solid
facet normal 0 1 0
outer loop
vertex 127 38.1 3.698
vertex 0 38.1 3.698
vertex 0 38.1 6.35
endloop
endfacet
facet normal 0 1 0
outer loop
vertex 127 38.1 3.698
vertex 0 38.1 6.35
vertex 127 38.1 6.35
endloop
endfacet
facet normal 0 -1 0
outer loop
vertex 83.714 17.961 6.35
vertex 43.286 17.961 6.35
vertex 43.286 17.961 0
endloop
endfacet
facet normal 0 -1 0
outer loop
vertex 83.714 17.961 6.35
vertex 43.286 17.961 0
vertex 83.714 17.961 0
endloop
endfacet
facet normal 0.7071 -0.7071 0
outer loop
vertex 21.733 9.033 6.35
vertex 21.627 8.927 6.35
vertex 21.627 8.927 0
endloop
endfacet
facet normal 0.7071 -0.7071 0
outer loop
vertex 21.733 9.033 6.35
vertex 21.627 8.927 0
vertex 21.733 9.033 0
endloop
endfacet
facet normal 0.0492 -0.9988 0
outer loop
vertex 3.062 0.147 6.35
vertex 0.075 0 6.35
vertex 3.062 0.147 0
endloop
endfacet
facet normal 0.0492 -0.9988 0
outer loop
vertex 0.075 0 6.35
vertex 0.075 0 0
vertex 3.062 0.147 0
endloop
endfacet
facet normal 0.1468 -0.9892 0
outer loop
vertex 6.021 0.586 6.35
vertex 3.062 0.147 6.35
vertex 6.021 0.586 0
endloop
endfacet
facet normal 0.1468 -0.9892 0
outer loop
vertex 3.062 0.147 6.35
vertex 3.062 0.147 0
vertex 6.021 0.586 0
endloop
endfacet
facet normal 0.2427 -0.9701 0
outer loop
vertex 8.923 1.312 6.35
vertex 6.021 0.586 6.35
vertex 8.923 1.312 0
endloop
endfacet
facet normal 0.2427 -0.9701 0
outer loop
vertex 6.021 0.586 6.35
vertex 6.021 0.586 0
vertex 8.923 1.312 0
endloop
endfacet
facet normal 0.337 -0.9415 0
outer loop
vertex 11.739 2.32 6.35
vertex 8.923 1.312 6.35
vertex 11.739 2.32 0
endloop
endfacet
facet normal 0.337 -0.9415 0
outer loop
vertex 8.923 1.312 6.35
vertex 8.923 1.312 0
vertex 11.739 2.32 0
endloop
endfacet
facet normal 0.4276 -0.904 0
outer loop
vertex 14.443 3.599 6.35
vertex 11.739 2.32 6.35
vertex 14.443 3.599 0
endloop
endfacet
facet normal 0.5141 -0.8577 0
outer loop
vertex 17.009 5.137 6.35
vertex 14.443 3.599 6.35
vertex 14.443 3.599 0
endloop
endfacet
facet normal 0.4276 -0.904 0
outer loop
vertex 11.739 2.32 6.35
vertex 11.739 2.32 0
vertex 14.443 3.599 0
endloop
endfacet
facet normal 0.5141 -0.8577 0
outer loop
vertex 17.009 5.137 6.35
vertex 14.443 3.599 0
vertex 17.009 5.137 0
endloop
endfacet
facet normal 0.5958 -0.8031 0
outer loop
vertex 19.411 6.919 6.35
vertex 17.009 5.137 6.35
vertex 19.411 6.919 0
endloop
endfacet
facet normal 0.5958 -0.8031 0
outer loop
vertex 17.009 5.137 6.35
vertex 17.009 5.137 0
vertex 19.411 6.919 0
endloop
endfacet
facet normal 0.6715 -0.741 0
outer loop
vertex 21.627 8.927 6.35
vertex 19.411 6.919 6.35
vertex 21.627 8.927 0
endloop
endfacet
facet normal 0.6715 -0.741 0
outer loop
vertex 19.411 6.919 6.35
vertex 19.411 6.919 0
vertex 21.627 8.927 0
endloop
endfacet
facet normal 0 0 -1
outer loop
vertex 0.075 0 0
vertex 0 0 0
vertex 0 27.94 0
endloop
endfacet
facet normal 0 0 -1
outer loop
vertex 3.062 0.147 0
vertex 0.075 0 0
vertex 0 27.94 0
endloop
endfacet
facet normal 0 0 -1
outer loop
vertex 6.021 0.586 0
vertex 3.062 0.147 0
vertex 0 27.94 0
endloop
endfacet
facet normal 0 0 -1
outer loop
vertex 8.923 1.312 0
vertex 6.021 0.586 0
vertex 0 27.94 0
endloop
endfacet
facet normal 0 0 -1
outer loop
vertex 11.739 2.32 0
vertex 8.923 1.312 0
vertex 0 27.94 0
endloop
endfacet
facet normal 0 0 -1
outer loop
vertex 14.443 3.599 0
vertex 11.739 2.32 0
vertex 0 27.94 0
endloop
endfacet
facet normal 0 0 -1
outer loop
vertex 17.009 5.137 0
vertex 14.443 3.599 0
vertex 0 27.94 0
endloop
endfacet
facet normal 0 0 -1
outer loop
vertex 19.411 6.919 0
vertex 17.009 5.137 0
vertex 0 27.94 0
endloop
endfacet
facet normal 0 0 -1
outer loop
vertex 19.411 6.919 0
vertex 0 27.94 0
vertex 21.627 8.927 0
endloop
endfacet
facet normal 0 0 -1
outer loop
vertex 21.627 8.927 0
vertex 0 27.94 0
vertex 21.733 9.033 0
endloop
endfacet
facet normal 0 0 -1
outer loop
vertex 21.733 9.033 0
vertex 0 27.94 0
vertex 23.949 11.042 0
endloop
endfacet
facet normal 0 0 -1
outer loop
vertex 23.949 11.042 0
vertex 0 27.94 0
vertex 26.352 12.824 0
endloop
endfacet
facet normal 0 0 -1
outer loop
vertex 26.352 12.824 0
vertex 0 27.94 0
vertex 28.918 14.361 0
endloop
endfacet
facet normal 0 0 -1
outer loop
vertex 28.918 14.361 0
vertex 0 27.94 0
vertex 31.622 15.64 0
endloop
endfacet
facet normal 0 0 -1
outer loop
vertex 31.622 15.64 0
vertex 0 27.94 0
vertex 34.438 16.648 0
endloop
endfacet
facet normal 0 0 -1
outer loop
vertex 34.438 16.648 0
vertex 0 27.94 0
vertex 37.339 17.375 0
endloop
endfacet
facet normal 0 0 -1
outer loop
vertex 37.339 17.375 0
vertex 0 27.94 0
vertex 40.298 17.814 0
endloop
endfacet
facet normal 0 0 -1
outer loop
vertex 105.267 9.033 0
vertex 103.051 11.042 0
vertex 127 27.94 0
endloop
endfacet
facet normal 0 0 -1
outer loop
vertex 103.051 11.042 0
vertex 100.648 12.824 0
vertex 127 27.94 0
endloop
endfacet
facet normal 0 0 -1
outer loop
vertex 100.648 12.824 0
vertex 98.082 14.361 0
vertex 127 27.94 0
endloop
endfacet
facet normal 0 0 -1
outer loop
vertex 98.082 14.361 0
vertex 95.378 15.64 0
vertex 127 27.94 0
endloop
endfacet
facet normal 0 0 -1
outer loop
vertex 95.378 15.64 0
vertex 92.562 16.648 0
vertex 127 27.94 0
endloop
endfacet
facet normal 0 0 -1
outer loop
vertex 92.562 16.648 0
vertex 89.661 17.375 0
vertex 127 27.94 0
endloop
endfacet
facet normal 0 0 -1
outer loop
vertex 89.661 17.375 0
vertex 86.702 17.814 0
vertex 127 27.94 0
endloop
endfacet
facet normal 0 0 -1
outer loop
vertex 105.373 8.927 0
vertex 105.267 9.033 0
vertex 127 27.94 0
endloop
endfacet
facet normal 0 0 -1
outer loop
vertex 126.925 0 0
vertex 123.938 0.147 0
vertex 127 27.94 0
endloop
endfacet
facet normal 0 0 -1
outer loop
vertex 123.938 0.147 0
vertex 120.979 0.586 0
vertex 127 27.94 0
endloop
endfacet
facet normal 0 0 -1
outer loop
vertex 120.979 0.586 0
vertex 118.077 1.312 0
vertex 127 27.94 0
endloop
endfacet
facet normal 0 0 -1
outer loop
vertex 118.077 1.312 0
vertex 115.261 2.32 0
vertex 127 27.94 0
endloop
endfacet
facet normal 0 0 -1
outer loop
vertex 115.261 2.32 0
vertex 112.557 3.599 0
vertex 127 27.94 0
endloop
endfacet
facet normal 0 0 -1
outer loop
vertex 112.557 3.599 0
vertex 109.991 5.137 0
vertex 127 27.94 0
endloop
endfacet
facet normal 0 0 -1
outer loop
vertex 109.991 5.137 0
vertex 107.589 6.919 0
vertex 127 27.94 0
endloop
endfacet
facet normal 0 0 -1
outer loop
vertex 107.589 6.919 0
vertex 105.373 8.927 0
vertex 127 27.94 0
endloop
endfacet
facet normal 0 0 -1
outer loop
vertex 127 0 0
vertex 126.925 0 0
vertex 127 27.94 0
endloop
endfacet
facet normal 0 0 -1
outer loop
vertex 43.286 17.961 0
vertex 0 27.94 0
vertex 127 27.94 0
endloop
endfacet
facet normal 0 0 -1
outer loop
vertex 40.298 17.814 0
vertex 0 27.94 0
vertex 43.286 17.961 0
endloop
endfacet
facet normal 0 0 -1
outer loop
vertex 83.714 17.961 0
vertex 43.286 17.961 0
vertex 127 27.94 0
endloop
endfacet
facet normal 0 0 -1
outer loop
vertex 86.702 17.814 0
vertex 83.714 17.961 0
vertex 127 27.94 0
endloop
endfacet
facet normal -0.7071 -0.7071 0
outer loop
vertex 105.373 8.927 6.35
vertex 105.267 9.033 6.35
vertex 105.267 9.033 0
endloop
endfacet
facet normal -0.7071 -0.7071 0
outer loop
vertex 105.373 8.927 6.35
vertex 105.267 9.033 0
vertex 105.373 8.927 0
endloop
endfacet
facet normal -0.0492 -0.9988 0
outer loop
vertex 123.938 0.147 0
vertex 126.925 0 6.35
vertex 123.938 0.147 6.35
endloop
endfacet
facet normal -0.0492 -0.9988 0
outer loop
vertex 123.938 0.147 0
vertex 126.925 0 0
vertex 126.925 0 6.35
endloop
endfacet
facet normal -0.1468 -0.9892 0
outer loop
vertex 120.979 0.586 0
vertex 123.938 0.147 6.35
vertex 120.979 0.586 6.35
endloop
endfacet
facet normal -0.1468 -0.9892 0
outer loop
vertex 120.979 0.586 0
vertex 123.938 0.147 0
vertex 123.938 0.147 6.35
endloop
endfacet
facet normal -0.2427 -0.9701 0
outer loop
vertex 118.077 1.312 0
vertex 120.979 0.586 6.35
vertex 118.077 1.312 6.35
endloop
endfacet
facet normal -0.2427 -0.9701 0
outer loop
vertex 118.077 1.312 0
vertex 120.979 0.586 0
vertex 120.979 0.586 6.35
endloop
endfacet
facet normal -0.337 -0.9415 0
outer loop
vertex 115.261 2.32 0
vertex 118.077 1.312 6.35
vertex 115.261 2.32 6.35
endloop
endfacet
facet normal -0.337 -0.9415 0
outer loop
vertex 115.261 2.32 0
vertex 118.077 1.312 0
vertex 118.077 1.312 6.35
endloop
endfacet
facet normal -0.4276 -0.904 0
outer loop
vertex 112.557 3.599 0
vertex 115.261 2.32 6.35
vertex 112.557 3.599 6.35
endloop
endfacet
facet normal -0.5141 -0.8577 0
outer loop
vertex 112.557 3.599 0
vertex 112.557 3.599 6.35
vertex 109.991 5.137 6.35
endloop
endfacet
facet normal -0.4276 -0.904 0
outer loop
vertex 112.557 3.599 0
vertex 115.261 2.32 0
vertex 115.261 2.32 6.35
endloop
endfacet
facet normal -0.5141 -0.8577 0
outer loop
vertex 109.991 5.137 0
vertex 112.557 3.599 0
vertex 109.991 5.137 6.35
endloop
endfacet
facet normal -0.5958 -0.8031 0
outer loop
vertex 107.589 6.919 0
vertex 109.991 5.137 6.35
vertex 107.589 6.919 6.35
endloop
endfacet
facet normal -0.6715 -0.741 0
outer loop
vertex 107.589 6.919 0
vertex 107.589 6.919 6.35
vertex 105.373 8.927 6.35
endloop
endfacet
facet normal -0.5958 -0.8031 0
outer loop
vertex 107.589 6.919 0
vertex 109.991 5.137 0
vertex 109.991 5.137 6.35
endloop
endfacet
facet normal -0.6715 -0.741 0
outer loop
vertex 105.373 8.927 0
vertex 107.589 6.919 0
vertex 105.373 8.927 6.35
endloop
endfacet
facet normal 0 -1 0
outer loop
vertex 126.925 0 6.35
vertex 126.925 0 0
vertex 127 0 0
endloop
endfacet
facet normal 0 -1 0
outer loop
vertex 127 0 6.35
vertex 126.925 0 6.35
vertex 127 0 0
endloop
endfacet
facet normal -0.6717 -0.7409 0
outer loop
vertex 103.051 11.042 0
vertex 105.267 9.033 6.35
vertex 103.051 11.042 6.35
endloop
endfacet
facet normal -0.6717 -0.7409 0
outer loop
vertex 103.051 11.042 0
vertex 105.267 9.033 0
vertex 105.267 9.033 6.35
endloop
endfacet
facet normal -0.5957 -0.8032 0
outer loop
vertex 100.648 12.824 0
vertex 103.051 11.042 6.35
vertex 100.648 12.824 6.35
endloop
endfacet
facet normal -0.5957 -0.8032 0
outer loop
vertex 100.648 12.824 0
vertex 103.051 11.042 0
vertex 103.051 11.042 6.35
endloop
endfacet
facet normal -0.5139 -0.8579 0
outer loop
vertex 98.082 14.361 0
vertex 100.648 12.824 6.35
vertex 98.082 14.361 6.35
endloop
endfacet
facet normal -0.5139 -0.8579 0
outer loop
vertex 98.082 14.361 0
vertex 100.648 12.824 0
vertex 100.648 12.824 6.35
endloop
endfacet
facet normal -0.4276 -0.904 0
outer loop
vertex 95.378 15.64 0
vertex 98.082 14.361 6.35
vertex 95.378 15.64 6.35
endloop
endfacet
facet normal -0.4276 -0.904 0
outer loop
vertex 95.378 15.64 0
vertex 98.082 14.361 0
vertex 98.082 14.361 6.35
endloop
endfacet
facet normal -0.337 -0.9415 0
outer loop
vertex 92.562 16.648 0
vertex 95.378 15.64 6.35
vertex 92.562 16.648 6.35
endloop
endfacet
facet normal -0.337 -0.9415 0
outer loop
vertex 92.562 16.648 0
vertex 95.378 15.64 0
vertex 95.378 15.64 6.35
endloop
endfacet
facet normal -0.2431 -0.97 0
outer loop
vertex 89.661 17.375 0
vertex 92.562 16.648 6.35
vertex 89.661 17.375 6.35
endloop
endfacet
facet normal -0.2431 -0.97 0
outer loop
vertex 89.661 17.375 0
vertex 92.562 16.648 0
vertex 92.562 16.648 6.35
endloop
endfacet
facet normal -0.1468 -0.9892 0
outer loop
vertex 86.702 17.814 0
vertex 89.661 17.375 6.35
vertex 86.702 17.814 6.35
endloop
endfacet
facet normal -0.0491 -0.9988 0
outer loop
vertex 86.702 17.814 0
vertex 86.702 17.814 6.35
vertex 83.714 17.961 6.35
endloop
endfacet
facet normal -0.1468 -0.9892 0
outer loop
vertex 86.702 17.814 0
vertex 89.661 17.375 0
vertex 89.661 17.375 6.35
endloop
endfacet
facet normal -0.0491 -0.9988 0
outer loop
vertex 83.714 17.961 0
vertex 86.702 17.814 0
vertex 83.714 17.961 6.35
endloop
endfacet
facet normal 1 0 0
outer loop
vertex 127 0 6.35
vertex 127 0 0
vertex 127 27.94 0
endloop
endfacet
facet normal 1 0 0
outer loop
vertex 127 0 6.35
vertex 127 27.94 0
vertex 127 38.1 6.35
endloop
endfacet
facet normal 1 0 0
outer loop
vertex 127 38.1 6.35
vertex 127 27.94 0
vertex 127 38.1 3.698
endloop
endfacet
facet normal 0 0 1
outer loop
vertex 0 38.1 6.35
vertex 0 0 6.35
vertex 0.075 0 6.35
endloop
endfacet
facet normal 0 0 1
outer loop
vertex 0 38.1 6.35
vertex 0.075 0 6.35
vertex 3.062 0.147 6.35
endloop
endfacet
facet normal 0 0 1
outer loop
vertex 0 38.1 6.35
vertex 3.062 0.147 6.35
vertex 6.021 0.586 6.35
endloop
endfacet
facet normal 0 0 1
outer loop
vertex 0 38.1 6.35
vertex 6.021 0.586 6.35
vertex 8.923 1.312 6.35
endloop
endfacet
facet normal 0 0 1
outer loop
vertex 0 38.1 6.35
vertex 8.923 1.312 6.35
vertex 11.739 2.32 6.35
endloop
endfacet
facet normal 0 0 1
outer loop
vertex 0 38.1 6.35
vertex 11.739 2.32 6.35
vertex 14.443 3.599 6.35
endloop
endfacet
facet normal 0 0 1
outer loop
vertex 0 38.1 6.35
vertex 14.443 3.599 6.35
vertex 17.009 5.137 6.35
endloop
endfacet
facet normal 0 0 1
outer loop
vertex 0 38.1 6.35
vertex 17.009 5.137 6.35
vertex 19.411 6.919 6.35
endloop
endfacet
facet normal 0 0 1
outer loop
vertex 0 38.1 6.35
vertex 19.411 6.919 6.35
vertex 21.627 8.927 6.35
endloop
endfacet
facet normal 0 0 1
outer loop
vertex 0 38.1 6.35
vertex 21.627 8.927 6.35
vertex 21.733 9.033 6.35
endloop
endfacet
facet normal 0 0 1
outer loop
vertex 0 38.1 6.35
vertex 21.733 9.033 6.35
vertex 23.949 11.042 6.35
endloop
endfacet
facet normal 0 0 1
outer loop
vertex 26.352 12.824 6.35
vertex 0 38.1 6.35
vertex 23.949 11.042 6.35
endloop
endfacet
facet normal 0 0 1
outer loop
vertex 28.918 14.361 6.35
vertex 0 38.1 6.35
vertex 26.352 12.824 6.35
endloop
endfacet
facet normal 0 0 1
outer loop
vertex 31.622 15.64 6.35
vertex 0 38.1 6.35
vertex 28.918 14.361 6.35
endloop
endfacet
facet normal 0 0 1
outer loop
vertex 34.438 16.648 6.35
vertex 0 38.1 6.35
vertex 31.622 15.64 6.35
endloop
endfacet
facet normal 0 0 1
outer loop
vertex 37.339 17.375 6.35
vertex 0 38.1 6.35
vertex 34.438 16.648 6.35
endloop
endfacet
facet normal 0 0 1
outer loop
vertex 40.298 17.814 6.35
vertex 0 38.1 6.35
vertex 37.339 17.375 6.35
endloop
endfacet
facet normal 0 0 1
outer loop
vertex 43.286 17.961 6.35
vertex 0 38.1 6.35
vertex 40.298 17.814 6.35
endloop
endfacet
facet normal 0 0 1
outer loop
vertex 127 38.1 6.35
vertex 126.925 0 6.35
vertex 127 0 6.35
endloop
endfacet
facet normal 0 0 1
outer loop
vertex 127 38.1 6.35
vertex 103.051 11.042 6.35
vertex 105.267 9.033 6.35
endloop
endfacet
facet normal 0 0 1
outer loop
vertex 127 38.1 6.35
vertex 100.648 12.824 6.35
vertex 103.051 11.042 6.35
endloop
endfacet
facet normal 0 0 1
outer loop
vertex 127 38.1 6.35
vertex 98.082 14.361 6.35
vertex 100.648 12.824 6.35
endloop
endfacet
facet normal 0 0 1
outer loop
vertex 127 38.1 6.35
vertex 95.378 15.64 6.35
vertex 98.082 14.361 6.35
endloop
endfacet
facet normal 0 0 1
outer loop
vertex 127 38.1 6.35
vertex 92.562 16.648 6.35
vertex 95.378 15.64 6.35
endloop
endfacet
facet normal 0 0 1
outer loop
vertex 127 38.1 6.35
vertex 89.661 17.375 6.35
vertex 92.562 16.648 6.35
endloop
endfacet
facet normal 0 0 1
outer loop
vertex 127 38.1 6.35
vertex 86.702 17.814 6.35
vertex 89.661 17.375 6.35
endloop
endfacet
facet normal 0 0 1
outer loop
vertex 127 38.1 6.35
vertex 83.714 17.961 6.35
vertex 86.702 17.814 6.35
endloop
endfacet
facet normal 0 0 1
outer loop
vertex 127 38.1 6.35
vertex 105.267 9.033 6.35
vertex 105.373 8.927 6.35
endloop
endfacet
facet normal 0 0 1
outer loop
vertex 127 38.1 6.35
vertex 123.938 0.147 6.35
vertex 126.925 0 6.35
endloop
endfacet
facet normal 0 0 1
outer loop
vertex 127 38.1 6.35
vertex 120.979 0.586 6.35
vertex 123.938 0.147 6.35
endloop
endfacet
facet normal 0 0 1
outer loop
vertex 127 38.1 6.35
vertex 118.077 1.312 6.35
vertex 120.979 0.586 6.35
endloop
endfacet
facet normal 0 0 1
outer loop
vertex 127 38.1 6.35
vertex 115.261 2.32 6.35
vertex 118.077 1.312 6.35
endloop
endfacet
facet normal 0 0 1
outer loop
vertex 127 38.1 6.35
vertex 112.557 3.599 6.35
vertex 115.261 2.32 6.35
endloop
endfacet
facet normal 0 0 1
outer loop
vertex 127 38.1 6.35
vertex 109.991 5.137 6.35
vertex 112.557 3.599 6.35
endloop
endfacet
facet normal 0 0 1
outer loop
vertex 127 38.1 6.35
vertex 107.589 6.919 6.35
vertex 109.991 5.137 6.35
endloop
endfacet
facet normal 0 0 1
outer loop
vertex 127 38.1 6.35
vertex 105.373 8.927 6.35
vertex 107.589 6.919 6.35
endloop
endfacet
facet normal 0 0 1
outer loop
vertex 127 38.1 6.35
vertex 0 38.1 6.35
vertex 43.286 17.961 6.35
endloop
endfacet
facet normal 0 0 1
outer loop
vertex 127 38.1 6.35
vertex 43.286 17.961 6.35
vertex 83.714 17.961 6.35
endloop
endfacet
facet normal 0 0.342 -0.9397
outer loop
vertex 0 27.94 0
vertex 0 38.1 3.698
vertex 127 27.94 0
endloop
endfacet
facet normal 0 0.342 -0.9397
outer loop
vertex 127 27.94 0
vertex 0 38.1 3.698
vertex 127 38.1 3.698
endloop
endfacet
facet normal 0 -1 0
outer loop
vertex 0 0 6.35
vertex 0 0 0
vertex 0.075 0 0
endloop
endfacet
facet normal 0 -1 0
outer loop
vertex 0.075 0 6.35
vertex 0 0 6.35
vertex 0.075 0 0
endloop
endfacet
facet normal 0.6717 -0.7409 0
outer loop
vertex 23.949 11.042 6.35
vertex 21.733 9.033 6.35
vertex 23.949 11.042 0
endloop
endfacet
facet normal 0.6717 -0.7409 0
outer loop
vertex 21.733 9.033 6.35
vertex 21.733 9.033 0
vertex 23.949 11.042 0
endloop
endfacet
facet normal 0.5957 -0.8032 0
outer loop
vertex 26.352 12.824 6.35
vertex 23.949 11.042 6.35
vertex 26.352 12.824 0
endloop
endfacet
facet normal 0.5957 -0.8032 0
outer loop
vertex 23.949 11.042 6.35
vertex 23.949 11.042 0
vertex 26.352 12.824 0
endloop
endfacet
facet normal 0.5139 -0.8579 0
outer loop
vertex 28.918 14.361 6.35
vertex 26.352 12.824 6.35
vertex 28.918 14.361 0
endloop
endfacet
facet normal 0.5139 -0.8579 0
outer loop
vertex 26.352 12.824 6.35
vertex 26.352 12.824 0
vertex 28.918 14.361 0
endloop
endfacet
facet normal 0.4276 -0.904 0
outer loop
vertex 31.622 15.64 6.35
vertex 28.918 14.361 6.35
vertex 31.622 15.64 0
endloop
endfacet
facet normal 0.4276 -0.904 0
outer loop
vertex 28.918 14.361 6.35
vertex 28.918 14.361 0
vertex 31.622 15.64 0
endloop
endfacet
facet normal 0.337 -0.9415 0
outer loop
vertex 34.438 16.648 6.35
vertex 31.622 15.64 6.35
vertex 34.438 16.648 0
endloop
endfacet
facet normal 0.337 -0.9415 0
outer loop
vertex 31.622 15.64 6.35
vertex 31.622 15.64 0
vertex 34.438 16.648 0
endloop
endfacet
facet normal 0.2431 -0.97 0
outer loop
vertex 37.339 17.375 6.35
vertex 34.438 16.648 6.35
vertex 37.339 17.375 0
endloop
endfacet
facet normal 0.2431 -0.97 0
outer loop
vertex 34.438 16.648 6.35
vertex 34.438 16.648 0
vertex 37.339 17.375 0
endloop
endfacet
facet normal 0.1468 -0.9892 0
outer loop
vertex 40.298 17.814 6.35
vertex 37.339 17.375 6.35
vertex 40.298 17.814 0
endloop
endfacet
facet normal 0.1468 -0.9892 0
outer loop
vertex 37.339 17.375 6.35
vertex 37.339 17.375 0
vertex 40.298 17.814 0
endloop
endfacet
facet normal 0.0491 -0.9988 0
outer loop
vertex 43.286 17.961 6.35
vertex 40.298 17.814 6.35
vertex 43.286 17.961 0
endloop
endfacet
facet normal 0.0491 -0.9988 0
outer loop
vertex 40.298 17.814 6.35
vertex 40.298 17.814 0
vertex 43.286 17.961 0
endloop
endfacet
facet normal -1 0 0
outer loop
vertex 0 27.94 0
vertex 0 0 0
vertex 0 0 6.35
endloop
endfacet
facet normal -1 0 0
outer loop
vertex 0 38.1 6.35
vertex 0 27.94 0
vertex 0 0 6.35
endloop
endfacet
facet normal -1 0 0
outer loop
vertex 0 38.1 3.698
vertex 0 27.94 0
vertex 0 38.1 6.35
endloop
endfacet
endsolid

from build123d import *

# Parameters (mm, degrees)
SKETCH1_W           = 127
SKETCH1_H           = 38.1
BOSS_EXTRUDE1_DEPTH = 6.35
CUT_EXTRUDE1_DEPTH  = 6.35
FILLET1_R           = 30.48
CHAMFER1_SIZE       = 10.16
CHAMFER1_SIZE2      = 3.69793758


with BuildPart() as part:
    # Sketch1 → Boss-Extrude1 (new body)
    with BuildSketch(Plane.XY):
        with Locations((63.5, 19.05)):
            Rectangle(SKETCH1_W, SKETCH1_H)
    extrude(amount=BOSS_EXTRUDE1_DEPTH)

    # Sketch2 → Cut-Extrude1 (cut)
    with BuildSketch(Plane.XY.offset(6.35)):
        Polygon((12.7, 0), (30.660512242, 17.960512242), (96.339487758, 17.960512242), (114.3, 0), align=None)
    extrude(amount=-CUT_EXTRUDE1_DEPTH, mode=Mode.SUBTRACT)

    # Fillet1
    fillet1_edges = [part.edges().sort_by_distance(p)[0] for p in [
        (114.3, 0, 3.175),
        (12.7, 0, 3.175),
        (30.660512242, 17.960512242, 3.175),
        (96.339487758, 17.960512242, 3.175),
    ]]
    fillet(fillet1_edges, radius=FILLET1_R)

    # Chamfer1
    chamfer1_edges = [part.edges().sort_by_distance(p)[0] for p in [
        (63.5, 38.1, 0),
    ]]
    chamfer1_side = [part.faces().sort_by_distance(p)[0] for p in [
        (63.5, 24.04441534, 0),
    ]]
    chamfer(chamfer1_edges, length=CHAMFER1_SIZE, length2=CHAMFER1_SIZE2, reference=chamfer1_side[0])


solid = part.part
